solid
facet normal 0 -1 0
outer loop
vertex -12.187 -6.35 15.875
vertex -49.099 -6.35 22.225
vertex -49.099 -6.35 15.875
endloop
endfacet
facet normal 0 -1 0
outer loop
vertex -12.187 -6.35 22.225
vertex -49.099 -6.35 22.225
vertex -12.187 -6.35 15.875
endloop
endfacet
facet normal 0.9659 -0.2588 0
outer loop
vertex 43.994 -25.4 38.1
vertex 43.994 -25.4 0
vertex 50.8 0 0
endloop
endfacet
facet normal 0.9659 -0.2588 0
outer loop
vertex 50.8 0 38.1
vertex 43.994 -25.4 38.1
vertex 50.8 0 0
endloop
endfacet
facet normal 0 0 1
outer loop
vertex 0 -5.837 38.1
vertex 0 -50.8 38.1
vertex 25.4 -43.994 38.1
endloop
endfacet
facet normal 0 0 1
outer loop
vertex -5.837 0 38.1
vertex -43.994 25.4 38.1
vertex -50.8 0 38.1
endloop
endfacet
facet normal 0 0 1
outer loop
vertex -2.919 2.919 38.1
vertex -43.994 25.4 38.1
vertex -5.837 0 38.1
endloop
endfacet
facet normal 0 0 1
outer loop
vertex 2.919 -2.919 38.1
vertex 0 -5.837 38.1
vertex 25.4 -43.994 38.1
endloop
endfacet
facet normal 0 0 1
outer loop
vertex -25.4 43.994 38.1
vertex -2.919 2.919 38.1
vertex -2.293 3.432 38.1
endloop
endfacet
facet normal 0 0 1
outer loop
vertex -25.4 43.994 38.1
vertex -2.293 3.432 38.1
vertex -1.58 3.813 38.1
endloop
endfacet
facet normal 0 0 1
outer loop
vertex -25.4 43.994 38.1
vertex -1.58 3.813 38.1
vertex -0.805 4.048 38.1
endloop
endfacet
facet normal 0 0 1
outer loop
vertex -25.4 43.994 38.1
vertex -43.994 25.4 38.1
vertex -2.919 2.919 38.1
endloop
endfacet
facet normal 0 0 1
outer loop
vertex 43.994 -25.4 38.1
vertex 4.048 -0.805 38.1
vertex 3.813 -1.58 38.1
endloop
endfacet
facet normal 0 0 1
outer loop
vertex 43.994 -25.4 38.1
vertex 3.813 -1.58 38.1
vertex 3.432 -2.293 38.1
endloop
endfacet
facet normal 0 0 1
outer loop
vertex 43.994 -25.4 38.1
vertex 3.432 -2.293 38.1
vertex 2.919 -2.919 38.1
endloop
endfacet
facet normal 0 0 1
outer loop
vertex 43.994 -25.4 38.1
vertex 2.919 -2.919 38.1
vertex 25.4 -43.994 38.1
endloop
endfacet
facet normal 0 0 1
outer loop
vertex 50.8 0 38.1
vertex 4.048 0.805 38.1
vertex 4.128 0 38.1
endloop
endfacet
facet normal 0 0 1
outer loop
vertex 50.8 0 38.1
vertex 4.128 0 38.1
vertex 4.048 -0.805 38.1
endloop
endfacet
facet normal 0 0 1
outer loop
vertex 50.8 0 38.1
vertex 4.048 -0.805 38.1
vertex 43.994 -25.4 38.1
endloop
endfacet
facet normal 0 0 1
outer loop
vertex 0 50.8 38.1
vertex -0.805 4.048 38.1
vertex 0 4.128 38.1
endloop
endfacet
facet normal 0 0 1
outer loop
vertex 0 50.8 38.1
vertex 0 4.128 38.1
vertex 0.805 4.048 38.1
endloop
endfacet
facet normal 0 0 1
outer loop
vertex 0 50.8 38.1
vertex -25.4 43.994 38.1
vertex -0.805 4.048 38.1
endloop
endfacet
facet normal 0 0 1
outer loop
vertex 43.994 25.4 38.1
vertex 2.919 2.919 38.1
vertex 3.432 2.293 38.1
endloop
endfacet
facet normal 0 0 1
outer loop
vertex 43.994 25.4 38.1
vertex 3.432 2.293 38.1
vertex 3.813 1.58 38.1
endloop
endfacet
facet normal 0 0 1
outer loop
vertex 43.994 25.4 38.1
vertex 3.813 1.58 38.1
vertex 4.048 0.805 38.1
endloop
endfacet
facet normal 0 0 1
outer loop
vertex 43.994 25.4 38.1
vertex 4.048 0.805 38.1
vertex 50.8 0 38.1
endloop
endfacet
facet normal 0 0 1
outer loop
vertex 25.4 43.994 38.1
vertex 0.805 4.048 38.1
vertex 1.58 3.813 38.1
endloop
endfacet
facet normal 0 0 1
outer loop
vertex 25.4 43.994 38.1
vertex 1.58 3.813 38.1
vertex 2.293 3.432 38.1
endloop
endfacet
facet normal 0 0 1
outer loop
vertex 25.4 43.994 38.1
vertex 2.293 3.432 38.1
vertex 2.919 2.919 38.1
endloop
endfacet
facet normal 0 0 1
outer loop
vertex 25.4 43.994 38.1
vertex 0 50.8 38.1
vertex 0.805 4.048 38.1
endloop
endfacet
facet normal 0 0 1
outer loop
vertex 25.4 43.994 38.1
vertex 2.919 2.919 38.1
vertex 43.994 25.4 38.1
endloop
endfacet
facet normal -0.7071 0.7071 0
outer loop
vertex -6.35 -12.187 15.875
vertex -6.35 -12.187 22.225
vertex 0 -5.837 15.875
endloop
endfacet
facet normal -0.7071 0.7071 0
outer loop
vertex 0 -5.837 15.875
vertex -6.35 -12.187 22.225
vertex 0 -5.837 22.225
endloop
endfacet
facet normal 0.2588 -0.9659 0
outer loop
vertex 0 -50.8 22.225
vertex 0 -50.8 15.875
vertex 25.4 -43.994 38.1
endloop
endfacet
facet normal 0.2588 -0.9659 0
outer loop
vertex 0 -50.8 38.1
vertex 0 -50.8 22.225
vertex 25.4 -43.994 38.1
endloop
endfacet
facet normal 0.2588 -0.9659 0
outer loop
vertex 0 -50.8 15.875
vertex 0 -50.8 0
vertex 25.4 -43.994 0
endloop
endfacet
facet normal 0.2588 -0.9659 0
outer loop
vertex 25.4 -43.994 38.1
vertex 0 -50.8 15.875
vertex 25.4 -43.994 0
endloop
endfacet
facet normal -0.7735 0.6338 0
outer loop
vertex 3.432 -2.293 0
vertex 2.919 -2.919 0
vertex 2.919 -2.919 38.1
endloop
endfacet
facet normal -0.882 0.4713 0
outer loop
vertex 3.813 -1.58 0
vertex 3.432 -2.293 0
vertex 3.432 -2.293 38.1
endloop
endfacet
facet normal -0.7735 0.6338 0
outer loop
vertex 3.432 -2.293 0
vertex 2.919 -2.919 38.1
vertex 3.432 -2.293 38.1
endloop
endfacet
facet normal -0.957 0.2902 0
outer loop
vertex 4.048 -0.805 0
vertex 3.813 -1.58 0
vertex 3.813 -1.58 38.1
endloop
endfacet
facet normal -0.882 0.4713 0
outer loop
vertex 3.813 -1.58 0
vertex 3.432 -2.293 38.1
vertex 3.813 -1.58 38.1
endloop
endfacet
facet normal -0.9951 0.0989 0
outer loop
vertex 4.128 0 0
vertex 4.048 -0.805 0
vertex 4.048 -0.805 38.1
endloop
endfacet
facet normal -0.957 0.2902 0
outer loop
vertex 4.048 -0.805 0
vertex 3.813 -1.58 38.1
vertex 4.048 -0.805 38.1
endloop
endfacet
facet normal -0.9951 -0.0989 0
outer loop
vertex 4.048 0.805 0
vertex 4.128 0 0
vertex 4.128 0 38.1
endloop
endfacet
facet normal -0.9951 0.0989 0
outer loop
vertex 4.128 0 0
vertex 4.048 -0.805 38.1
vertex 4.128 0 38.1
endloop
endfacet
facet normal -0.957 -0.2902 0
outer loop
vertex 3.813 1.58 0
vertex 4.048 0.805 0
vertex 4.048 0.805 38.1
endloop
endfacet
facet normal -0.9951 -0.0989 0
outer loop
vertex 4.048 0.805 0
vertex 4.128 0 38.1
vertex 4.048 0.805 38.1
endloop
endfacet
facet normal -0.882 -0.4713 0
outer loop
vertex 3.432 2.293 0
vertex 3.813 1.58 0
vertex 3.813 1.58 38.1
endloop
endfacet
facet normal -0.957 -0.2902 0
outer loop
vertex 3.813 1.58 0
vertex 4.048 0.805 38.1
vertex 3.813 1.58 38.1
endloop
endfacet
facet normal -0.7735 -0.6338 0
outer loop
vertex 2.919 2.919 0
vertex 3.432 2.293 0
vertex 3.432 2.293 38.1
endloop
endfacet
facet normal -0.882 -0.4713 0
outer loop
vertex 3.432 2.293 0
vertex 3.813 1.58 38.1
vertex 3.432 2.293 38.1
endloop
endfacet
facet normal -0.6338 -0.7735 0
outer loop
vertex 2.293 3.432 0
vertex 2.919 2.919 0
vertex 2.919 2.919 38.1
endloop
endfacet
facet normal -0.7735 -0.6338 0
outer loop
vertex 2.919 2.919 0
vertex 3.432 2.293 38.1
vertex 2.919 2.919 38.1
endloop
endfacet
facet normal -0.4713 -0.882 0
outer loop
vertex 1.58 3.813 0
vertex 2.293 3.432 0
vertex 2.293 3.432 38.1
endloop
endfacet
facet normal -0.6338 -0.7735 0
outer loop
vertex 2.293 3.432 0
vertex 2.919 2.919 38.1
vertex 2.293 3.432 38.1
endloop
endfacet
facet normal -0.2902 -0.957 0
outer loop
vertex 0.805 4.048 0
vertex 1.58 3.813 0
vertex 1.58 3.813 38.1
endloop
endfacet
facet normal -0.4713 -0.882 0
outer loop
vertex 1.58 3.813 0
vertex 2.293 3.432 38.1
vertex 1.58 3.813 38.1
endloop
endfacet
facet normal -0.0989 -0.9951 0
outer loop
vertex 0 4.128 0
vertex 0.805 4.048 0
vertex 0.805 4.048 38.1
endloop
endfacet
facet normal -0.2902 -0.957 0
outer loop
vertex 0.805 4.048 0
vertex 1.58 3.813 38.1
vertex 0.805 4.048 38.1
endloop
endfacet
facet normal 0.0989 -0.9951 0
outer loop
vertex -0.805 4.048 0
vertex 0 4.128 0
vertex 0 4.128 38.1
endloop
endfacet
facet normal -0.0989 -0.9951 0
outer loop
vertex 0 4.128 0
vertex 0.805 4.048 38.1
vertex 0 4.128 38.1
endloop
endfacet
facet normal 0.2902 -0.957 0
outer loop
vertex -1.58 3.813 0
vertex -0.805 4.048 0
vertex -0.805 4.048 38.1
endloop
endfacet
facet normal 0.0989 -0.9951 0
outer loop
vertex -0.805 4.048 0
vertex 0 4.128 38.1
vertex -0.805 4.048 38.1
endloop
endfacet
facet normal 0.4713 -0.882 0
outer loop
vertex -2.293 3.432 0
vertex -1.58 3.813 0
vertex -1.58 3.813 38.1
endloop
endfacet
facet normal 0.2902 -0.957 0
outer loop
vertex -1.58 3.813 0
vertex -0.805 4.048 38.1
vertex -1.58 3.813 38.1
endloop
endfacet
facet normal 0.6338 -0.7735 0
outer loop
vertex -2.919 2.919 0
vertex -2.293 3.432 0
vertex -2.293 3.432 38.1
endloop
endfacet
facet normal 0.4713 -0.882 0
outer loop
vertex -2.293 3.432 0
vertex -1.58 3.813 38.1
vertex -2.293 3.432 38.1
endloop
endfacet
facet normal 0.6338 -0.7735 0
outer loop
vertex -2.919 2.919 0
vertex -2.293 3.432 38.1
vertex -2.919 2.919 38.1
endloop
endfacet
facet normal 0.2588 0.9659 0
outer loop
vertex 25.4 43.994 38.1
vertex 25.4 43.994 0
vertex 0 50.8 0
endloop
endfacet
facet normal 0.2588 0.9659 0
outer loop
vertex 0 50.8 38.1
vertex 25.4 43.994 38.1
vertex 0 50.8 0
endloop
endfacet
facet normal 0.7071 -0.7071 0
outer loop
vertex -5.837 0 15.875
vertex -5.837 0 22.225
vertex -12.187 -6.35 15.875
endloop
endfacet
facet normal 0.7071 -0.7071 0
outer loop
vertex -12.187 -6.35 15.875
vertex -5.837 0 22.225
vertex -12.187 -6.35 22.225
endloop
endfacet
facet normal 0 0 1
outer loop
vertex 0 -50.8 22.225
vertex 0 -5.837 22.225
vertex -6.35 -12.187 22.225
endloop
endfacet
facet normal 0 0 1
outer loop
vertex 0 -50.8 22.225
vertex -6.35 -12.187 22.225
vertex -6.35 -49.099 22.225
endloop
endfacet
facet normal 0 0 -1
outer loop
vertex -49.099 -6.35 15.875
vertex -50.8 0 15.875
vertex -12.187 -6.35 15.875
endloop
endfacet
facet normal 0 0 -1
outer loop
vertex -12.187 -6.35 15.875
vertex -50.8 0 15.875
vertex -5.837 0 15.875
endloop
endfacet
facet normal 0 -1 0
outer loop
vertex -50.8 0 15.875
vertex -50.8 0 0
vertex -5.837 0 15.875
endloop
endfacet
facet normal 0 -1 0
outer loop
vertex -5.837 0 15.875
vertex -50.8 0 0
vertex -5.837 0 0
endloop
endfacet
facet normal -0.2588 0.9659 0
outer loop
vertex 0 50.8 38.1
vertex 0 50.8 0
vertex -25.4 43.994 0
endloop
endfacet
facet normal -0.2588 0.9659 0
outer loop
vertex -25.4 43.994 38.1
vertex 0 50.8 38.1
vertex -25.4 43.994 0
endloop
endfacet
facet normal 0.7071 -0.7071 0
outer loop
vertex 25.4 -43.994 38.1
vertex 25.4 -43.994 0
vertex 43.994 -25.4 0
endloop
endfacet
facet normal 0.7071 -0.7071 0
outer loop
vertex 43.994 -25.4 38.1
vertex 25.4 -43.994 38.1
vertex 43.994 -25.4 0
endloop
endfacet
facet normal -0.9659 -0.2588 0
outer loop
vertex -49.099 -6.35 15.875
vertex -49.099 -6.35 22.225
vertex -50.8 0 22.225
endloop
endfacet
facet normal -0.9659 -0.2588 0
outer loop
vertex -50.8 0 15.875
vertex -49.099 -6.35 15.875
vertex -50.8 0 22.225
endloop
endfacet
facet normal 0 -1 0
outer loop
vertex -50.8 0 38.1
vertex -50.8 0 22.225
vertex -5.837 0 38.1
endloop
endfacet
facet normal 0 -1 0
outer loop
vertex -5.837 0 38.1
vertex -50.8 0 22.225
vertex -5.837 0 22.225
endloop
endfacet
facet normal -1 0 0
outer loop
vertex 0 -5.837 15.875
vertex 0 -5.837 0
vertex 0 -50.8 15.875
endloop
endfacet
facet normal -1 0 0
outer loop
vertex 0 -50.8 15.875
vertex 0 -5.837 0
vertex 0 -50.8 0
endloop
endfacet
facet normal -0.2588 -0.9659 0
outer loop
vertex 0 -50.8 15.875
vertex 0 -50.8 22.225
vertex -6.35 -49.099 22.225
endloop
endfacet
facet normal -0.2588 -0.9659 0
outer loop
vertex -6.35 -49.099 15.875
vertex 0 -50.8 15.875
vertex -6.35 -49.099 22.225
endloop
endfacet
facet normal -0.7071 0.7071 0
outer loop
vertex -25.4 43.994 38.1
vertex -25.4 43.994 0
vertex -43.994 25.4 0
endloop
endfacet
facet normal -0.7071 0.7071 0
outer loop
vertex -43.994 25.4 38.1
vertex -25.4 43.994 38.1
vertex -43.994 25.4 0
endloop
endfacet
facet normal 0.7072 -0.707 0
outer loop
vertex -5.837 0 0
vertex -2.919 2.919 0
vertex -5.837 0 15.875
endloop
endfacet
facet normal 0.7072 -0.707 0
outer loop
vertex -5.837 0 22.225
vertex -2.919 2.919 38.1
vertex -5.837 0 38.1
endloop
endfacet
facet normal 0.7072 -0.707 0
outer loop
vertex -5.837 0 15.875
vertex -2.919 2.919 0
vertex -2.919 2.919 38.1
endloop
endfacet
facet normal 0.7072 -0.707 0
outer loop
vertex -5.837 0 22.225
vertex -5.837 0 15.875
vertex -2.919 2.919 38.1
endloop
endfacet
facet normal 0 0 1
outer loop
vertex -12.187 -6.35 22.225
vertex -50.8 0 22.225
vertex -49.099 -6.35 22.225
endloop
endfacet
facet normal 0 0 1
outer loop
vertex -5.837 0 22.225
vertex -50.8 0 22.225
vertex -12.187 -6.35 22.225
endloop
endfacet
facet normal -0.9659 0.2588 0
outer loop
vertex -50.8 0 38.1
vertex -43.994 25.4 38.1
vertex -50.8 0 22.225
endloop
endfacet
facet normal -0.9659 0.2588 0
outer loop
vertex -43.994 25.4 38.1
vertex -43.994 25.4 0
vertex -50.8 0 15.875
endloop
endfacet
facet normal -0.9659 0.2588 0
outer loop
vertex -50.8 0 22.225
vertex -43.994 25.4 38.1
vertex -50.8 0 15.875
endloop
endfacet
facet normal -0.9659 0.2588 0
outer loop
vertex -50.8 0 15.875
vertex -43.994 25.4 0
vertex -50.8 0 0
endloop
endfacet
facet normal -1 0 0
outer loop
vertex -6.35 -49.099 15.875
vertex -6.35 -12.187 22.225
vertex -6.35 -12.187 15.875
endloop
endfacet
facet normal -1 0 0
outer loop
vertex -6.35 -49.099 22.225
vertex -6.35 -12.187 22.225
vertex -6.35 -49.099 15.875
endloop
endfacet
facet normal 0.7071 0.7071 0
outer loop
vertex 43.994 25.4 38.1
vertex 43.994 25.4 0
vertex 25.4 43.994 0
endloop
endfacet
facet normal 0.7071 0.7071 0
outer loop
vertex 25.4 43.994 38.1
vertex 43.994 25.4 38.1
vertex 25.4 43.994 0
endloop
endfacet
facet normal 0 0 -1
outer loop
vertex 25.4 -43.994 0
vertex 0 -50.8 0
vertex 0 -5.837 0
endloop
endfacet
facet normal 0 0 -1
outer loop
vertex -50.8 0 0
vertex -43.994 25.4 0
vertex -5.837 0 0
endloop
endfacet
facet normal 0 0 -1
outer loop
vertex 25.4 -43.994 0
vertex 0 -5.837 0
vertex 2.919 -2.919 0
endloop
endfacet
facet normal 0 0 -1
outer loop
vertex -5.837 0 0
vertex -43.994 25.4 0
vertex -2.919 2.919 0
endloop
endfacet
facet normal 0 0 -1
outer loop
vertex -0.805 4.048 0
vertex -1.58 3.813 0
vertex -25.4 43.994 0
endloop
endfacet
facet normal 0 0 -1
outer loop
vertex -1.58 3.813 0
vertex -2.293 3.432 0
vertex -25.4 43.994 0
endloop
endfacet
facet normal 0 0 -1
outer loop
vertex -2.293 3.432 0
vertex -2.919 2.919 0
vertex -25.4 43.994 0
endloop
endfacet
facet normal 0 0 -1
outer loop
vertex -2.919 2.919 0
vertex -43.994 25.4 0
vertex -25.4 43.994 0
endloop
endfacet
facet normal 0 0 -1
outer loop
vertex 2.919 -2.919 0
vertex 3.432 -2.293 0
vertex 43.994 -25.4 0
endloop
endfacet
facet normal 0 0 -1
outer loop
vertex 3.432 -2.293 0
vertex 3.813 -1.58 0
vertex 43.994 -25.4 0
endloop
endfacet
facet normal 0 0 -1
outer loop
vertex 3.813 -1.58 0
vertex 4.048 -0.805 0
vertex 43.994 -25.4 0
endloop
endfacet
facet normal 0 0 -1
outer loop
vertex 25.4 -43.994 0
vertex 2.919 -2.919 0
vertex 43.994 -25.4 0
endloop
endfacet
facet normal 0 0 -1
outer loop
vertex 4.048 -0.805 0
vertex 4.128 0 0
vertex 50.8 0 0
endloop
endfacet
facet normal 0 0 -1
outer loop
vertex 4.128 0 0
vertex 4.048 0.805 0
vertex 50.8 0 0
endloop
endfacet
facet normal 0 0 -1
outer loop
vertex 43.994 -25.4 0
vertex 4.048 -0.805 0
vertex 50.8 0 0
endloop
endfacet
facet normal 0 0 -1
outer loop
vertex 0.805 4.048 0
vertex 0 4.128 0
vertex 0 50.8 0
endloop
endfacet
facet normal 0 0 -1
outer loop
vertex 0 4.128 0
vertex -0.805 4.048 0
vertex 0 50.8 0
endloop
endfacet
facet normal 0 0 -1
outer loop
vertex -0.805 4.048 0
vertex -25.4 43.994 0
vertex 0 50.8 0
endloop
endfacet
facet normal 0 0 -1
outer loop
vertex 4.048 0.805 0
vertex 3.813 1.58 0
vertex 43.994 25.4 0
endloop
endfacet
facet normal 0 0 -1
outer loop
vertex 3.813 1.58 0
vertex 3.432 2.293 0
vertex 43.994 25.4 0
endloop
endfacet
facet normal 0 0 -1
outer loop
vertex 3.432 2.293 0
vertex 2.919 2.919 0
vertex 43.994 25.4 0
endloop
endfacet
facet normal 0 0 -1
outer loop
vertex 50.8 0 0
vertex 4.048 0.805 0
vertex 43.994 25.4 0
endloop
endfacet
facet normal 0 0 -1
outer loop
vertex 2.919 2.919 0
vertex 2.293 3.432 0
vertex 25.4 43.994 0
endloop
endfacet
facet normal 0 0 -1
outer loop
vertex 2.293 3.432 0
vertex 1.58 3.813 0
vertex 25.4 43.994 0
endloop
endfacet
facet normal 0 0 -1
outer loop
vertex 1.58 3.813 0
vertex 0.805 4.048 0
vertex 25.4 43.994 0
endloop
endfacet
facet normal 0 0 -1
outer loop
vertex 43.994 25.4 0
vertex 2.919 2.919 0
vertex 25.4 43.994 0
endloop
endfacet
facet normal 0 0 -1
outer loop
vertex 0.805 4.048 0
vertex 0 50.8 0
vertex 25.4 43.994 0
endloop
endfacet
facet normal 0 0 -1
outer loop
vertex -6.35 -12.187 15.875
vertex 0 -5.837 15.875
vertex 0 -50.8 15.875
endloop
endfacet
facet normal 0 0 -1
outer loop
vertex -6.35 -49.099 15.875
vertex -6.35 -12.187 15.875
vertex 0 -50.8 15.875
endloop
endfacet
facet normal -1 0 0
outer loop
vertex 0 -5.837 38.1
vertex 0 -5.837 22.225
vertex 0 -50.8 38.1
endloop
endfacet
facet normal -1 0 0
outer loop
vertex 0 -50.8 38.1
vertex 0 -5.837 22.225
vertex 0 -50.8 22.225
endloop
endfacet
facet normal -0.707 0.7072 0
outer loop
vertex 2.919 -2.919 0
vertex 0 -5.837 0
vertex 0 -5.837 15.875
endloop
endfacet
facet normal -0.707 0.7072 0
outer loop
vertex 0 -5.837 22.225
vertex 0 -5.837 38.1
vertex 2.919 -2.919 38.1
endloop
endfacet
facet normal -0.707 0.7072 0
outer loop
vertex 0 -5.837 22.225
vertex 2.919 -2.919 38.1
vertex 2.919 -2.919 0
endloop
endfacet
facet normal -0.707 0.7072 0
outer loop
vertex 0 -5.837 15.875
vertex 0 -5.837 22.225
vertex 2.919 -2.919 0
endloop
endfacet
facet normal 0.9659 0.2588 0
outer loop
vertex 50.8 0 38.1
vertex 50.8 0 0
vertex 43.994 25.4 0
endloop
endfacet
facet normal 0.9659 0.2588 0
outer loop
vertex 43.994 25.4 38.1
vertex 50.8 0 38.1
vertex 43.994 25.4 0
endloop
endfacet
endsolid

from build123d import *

# Parameters (mm, degrees)
F1_DEPTH  = 38.1
F2_W      = 50.8
F2_H      = 3.175
F3_DEPTH  = 6.35
F5_DEPTH  = 25.4
F6_W      = 44.45
F6_H      = 6.35
F7_DEPTH  = 6.35
F9_DEPTH  = 25.4
F10_R     = 4.1275
F11_DEPTH = 127
F13_DEPTH = 127


# Not quite as in the source:
# - a feature names something its author has since deleted; it is built from what else it names


with BuildPart() as f1:
    # F0 (on Top) → F1 (new body)
    with BuildSketch(Plane.XY):
        Polygon((43.9940905122, -25.4), (50.8, 0), (43.9940905122, 25.4), (25.4, 43.9940905122), (0, 50.8), (-25.4, 43.9940905122), (-43.9940905122, 25.4), (-50.8, 0), (0, 0), (0, -50.8), (25.4, -43.9940905122), align=None)
    extrude(amount=F1_DEPTH)

    # F2 (on face) → F3 (join)
    with BuildSketch(Plane.XZ):
        with Locations((-25.4, 20.6375)):
            Rectangle(F2_W, F2_H)
        with Locations((-25.4, 17.4625)):
            Rectangle(F2_W, F2_H)
    extrude(amount=F3_DEPTH)

    # F4 (on face) → F5 (cut)
    with BuildSketch(Plane.XY.offset(22.225)):
        Polygon((-49.0985226281, -6.35), (-50.8, 0), (-50.8, -6.35), align=None)
    extrude(amount=-F5_DEPTH, mode=Mode.SUBTRACT)

    # F6 (on face) → F7 (join)
    with BuildSketch(Plane(origin=(0, 0, 0), x_dir=(0, -1, 0), z_dir=(-1, 0, 0))):
        with Locations((28.575, 19.05)):
            Rectangle(F6_W, F6_H)
    extrude(amount=F7_DEPTH)

    # F8 (on face) → F9 (cut)
    with BuildSketch(Plane.XY.offset(22.225)):
        Polygon((-6.35, -50.8), (0, -50.8), (-6.35, -49.0985226281), align=None)
    extrude(amount=-F9_DEPTH, mode=Mode.SUBTRACT)

    # F10 (on face) → F11 (cut)
    with BuildSketch(Plane.XY.offset(38.1)):
        Circle(F10_R)
    extrude(amount=-F11_DEPTH, mode=Mode.SUBTRACT)

    # F12 (on face) → F13 (cut)
    with BuildSketch(Plane.XY.offset(38.1)):
        with BuildLine():
            ThreePointArc((-4.1275, 0), (-3.8133127704, 1.5795258671), (-2.9185832393, 2.9185832393))
            Line((-2.9185832393, 2.9185832393), (-5.8371664787, 0))
            Line((-5.8371664787, 0), (-4.1275, 0))
        make_face()
        with BuildLine():
            ThreePointArc((4.1275, 0), (1.5795258671, 3.8133127704), (-2.9185832393, 2.9185832393))
            ThreePointArc((-2.9185832393, 2.9185832393), (-3.8133127704, 1.5795258671), (-4.1275, 0))
            Line((-4.1275, 0), (-5.8371664787, 0))
            Line((-5.8371664787, 0), (-18.7979032201, -12.9607367414))
            Line((-18.7979032201, -12.9607367414), (-12.9607367414, -18.7979032201))
            Line((-12.9607367414, -18.7979032201), (0, -5.8371664787))
            Line((0, -5.8371664787), (0, -4.1275))
            ThreePointArc((0, -4.1275), (1.5795258671, -3.8133127704), (2.9185832393, -2.9185832393))
            ThreePointArc((2.9185832393, -2.9185832393), (3.8133127704, -1.5795258671), (4.1275, 0))
        make_face()
        with BuildLine():
            Line((0, -5.8371664787), (2.9185832393, -2.9185832393))
            ThreePointArc((2.9185832393, -2.9185832393), (1.5795258671, -3.8133127704), (0, -4.1275))
            Line((0, -4.1275), (0, -5.8371664787))
        make_face()
    extrude(amount=-F13_DEPTH, mode=Mode.SUBTRACT)


solid = f1.part
